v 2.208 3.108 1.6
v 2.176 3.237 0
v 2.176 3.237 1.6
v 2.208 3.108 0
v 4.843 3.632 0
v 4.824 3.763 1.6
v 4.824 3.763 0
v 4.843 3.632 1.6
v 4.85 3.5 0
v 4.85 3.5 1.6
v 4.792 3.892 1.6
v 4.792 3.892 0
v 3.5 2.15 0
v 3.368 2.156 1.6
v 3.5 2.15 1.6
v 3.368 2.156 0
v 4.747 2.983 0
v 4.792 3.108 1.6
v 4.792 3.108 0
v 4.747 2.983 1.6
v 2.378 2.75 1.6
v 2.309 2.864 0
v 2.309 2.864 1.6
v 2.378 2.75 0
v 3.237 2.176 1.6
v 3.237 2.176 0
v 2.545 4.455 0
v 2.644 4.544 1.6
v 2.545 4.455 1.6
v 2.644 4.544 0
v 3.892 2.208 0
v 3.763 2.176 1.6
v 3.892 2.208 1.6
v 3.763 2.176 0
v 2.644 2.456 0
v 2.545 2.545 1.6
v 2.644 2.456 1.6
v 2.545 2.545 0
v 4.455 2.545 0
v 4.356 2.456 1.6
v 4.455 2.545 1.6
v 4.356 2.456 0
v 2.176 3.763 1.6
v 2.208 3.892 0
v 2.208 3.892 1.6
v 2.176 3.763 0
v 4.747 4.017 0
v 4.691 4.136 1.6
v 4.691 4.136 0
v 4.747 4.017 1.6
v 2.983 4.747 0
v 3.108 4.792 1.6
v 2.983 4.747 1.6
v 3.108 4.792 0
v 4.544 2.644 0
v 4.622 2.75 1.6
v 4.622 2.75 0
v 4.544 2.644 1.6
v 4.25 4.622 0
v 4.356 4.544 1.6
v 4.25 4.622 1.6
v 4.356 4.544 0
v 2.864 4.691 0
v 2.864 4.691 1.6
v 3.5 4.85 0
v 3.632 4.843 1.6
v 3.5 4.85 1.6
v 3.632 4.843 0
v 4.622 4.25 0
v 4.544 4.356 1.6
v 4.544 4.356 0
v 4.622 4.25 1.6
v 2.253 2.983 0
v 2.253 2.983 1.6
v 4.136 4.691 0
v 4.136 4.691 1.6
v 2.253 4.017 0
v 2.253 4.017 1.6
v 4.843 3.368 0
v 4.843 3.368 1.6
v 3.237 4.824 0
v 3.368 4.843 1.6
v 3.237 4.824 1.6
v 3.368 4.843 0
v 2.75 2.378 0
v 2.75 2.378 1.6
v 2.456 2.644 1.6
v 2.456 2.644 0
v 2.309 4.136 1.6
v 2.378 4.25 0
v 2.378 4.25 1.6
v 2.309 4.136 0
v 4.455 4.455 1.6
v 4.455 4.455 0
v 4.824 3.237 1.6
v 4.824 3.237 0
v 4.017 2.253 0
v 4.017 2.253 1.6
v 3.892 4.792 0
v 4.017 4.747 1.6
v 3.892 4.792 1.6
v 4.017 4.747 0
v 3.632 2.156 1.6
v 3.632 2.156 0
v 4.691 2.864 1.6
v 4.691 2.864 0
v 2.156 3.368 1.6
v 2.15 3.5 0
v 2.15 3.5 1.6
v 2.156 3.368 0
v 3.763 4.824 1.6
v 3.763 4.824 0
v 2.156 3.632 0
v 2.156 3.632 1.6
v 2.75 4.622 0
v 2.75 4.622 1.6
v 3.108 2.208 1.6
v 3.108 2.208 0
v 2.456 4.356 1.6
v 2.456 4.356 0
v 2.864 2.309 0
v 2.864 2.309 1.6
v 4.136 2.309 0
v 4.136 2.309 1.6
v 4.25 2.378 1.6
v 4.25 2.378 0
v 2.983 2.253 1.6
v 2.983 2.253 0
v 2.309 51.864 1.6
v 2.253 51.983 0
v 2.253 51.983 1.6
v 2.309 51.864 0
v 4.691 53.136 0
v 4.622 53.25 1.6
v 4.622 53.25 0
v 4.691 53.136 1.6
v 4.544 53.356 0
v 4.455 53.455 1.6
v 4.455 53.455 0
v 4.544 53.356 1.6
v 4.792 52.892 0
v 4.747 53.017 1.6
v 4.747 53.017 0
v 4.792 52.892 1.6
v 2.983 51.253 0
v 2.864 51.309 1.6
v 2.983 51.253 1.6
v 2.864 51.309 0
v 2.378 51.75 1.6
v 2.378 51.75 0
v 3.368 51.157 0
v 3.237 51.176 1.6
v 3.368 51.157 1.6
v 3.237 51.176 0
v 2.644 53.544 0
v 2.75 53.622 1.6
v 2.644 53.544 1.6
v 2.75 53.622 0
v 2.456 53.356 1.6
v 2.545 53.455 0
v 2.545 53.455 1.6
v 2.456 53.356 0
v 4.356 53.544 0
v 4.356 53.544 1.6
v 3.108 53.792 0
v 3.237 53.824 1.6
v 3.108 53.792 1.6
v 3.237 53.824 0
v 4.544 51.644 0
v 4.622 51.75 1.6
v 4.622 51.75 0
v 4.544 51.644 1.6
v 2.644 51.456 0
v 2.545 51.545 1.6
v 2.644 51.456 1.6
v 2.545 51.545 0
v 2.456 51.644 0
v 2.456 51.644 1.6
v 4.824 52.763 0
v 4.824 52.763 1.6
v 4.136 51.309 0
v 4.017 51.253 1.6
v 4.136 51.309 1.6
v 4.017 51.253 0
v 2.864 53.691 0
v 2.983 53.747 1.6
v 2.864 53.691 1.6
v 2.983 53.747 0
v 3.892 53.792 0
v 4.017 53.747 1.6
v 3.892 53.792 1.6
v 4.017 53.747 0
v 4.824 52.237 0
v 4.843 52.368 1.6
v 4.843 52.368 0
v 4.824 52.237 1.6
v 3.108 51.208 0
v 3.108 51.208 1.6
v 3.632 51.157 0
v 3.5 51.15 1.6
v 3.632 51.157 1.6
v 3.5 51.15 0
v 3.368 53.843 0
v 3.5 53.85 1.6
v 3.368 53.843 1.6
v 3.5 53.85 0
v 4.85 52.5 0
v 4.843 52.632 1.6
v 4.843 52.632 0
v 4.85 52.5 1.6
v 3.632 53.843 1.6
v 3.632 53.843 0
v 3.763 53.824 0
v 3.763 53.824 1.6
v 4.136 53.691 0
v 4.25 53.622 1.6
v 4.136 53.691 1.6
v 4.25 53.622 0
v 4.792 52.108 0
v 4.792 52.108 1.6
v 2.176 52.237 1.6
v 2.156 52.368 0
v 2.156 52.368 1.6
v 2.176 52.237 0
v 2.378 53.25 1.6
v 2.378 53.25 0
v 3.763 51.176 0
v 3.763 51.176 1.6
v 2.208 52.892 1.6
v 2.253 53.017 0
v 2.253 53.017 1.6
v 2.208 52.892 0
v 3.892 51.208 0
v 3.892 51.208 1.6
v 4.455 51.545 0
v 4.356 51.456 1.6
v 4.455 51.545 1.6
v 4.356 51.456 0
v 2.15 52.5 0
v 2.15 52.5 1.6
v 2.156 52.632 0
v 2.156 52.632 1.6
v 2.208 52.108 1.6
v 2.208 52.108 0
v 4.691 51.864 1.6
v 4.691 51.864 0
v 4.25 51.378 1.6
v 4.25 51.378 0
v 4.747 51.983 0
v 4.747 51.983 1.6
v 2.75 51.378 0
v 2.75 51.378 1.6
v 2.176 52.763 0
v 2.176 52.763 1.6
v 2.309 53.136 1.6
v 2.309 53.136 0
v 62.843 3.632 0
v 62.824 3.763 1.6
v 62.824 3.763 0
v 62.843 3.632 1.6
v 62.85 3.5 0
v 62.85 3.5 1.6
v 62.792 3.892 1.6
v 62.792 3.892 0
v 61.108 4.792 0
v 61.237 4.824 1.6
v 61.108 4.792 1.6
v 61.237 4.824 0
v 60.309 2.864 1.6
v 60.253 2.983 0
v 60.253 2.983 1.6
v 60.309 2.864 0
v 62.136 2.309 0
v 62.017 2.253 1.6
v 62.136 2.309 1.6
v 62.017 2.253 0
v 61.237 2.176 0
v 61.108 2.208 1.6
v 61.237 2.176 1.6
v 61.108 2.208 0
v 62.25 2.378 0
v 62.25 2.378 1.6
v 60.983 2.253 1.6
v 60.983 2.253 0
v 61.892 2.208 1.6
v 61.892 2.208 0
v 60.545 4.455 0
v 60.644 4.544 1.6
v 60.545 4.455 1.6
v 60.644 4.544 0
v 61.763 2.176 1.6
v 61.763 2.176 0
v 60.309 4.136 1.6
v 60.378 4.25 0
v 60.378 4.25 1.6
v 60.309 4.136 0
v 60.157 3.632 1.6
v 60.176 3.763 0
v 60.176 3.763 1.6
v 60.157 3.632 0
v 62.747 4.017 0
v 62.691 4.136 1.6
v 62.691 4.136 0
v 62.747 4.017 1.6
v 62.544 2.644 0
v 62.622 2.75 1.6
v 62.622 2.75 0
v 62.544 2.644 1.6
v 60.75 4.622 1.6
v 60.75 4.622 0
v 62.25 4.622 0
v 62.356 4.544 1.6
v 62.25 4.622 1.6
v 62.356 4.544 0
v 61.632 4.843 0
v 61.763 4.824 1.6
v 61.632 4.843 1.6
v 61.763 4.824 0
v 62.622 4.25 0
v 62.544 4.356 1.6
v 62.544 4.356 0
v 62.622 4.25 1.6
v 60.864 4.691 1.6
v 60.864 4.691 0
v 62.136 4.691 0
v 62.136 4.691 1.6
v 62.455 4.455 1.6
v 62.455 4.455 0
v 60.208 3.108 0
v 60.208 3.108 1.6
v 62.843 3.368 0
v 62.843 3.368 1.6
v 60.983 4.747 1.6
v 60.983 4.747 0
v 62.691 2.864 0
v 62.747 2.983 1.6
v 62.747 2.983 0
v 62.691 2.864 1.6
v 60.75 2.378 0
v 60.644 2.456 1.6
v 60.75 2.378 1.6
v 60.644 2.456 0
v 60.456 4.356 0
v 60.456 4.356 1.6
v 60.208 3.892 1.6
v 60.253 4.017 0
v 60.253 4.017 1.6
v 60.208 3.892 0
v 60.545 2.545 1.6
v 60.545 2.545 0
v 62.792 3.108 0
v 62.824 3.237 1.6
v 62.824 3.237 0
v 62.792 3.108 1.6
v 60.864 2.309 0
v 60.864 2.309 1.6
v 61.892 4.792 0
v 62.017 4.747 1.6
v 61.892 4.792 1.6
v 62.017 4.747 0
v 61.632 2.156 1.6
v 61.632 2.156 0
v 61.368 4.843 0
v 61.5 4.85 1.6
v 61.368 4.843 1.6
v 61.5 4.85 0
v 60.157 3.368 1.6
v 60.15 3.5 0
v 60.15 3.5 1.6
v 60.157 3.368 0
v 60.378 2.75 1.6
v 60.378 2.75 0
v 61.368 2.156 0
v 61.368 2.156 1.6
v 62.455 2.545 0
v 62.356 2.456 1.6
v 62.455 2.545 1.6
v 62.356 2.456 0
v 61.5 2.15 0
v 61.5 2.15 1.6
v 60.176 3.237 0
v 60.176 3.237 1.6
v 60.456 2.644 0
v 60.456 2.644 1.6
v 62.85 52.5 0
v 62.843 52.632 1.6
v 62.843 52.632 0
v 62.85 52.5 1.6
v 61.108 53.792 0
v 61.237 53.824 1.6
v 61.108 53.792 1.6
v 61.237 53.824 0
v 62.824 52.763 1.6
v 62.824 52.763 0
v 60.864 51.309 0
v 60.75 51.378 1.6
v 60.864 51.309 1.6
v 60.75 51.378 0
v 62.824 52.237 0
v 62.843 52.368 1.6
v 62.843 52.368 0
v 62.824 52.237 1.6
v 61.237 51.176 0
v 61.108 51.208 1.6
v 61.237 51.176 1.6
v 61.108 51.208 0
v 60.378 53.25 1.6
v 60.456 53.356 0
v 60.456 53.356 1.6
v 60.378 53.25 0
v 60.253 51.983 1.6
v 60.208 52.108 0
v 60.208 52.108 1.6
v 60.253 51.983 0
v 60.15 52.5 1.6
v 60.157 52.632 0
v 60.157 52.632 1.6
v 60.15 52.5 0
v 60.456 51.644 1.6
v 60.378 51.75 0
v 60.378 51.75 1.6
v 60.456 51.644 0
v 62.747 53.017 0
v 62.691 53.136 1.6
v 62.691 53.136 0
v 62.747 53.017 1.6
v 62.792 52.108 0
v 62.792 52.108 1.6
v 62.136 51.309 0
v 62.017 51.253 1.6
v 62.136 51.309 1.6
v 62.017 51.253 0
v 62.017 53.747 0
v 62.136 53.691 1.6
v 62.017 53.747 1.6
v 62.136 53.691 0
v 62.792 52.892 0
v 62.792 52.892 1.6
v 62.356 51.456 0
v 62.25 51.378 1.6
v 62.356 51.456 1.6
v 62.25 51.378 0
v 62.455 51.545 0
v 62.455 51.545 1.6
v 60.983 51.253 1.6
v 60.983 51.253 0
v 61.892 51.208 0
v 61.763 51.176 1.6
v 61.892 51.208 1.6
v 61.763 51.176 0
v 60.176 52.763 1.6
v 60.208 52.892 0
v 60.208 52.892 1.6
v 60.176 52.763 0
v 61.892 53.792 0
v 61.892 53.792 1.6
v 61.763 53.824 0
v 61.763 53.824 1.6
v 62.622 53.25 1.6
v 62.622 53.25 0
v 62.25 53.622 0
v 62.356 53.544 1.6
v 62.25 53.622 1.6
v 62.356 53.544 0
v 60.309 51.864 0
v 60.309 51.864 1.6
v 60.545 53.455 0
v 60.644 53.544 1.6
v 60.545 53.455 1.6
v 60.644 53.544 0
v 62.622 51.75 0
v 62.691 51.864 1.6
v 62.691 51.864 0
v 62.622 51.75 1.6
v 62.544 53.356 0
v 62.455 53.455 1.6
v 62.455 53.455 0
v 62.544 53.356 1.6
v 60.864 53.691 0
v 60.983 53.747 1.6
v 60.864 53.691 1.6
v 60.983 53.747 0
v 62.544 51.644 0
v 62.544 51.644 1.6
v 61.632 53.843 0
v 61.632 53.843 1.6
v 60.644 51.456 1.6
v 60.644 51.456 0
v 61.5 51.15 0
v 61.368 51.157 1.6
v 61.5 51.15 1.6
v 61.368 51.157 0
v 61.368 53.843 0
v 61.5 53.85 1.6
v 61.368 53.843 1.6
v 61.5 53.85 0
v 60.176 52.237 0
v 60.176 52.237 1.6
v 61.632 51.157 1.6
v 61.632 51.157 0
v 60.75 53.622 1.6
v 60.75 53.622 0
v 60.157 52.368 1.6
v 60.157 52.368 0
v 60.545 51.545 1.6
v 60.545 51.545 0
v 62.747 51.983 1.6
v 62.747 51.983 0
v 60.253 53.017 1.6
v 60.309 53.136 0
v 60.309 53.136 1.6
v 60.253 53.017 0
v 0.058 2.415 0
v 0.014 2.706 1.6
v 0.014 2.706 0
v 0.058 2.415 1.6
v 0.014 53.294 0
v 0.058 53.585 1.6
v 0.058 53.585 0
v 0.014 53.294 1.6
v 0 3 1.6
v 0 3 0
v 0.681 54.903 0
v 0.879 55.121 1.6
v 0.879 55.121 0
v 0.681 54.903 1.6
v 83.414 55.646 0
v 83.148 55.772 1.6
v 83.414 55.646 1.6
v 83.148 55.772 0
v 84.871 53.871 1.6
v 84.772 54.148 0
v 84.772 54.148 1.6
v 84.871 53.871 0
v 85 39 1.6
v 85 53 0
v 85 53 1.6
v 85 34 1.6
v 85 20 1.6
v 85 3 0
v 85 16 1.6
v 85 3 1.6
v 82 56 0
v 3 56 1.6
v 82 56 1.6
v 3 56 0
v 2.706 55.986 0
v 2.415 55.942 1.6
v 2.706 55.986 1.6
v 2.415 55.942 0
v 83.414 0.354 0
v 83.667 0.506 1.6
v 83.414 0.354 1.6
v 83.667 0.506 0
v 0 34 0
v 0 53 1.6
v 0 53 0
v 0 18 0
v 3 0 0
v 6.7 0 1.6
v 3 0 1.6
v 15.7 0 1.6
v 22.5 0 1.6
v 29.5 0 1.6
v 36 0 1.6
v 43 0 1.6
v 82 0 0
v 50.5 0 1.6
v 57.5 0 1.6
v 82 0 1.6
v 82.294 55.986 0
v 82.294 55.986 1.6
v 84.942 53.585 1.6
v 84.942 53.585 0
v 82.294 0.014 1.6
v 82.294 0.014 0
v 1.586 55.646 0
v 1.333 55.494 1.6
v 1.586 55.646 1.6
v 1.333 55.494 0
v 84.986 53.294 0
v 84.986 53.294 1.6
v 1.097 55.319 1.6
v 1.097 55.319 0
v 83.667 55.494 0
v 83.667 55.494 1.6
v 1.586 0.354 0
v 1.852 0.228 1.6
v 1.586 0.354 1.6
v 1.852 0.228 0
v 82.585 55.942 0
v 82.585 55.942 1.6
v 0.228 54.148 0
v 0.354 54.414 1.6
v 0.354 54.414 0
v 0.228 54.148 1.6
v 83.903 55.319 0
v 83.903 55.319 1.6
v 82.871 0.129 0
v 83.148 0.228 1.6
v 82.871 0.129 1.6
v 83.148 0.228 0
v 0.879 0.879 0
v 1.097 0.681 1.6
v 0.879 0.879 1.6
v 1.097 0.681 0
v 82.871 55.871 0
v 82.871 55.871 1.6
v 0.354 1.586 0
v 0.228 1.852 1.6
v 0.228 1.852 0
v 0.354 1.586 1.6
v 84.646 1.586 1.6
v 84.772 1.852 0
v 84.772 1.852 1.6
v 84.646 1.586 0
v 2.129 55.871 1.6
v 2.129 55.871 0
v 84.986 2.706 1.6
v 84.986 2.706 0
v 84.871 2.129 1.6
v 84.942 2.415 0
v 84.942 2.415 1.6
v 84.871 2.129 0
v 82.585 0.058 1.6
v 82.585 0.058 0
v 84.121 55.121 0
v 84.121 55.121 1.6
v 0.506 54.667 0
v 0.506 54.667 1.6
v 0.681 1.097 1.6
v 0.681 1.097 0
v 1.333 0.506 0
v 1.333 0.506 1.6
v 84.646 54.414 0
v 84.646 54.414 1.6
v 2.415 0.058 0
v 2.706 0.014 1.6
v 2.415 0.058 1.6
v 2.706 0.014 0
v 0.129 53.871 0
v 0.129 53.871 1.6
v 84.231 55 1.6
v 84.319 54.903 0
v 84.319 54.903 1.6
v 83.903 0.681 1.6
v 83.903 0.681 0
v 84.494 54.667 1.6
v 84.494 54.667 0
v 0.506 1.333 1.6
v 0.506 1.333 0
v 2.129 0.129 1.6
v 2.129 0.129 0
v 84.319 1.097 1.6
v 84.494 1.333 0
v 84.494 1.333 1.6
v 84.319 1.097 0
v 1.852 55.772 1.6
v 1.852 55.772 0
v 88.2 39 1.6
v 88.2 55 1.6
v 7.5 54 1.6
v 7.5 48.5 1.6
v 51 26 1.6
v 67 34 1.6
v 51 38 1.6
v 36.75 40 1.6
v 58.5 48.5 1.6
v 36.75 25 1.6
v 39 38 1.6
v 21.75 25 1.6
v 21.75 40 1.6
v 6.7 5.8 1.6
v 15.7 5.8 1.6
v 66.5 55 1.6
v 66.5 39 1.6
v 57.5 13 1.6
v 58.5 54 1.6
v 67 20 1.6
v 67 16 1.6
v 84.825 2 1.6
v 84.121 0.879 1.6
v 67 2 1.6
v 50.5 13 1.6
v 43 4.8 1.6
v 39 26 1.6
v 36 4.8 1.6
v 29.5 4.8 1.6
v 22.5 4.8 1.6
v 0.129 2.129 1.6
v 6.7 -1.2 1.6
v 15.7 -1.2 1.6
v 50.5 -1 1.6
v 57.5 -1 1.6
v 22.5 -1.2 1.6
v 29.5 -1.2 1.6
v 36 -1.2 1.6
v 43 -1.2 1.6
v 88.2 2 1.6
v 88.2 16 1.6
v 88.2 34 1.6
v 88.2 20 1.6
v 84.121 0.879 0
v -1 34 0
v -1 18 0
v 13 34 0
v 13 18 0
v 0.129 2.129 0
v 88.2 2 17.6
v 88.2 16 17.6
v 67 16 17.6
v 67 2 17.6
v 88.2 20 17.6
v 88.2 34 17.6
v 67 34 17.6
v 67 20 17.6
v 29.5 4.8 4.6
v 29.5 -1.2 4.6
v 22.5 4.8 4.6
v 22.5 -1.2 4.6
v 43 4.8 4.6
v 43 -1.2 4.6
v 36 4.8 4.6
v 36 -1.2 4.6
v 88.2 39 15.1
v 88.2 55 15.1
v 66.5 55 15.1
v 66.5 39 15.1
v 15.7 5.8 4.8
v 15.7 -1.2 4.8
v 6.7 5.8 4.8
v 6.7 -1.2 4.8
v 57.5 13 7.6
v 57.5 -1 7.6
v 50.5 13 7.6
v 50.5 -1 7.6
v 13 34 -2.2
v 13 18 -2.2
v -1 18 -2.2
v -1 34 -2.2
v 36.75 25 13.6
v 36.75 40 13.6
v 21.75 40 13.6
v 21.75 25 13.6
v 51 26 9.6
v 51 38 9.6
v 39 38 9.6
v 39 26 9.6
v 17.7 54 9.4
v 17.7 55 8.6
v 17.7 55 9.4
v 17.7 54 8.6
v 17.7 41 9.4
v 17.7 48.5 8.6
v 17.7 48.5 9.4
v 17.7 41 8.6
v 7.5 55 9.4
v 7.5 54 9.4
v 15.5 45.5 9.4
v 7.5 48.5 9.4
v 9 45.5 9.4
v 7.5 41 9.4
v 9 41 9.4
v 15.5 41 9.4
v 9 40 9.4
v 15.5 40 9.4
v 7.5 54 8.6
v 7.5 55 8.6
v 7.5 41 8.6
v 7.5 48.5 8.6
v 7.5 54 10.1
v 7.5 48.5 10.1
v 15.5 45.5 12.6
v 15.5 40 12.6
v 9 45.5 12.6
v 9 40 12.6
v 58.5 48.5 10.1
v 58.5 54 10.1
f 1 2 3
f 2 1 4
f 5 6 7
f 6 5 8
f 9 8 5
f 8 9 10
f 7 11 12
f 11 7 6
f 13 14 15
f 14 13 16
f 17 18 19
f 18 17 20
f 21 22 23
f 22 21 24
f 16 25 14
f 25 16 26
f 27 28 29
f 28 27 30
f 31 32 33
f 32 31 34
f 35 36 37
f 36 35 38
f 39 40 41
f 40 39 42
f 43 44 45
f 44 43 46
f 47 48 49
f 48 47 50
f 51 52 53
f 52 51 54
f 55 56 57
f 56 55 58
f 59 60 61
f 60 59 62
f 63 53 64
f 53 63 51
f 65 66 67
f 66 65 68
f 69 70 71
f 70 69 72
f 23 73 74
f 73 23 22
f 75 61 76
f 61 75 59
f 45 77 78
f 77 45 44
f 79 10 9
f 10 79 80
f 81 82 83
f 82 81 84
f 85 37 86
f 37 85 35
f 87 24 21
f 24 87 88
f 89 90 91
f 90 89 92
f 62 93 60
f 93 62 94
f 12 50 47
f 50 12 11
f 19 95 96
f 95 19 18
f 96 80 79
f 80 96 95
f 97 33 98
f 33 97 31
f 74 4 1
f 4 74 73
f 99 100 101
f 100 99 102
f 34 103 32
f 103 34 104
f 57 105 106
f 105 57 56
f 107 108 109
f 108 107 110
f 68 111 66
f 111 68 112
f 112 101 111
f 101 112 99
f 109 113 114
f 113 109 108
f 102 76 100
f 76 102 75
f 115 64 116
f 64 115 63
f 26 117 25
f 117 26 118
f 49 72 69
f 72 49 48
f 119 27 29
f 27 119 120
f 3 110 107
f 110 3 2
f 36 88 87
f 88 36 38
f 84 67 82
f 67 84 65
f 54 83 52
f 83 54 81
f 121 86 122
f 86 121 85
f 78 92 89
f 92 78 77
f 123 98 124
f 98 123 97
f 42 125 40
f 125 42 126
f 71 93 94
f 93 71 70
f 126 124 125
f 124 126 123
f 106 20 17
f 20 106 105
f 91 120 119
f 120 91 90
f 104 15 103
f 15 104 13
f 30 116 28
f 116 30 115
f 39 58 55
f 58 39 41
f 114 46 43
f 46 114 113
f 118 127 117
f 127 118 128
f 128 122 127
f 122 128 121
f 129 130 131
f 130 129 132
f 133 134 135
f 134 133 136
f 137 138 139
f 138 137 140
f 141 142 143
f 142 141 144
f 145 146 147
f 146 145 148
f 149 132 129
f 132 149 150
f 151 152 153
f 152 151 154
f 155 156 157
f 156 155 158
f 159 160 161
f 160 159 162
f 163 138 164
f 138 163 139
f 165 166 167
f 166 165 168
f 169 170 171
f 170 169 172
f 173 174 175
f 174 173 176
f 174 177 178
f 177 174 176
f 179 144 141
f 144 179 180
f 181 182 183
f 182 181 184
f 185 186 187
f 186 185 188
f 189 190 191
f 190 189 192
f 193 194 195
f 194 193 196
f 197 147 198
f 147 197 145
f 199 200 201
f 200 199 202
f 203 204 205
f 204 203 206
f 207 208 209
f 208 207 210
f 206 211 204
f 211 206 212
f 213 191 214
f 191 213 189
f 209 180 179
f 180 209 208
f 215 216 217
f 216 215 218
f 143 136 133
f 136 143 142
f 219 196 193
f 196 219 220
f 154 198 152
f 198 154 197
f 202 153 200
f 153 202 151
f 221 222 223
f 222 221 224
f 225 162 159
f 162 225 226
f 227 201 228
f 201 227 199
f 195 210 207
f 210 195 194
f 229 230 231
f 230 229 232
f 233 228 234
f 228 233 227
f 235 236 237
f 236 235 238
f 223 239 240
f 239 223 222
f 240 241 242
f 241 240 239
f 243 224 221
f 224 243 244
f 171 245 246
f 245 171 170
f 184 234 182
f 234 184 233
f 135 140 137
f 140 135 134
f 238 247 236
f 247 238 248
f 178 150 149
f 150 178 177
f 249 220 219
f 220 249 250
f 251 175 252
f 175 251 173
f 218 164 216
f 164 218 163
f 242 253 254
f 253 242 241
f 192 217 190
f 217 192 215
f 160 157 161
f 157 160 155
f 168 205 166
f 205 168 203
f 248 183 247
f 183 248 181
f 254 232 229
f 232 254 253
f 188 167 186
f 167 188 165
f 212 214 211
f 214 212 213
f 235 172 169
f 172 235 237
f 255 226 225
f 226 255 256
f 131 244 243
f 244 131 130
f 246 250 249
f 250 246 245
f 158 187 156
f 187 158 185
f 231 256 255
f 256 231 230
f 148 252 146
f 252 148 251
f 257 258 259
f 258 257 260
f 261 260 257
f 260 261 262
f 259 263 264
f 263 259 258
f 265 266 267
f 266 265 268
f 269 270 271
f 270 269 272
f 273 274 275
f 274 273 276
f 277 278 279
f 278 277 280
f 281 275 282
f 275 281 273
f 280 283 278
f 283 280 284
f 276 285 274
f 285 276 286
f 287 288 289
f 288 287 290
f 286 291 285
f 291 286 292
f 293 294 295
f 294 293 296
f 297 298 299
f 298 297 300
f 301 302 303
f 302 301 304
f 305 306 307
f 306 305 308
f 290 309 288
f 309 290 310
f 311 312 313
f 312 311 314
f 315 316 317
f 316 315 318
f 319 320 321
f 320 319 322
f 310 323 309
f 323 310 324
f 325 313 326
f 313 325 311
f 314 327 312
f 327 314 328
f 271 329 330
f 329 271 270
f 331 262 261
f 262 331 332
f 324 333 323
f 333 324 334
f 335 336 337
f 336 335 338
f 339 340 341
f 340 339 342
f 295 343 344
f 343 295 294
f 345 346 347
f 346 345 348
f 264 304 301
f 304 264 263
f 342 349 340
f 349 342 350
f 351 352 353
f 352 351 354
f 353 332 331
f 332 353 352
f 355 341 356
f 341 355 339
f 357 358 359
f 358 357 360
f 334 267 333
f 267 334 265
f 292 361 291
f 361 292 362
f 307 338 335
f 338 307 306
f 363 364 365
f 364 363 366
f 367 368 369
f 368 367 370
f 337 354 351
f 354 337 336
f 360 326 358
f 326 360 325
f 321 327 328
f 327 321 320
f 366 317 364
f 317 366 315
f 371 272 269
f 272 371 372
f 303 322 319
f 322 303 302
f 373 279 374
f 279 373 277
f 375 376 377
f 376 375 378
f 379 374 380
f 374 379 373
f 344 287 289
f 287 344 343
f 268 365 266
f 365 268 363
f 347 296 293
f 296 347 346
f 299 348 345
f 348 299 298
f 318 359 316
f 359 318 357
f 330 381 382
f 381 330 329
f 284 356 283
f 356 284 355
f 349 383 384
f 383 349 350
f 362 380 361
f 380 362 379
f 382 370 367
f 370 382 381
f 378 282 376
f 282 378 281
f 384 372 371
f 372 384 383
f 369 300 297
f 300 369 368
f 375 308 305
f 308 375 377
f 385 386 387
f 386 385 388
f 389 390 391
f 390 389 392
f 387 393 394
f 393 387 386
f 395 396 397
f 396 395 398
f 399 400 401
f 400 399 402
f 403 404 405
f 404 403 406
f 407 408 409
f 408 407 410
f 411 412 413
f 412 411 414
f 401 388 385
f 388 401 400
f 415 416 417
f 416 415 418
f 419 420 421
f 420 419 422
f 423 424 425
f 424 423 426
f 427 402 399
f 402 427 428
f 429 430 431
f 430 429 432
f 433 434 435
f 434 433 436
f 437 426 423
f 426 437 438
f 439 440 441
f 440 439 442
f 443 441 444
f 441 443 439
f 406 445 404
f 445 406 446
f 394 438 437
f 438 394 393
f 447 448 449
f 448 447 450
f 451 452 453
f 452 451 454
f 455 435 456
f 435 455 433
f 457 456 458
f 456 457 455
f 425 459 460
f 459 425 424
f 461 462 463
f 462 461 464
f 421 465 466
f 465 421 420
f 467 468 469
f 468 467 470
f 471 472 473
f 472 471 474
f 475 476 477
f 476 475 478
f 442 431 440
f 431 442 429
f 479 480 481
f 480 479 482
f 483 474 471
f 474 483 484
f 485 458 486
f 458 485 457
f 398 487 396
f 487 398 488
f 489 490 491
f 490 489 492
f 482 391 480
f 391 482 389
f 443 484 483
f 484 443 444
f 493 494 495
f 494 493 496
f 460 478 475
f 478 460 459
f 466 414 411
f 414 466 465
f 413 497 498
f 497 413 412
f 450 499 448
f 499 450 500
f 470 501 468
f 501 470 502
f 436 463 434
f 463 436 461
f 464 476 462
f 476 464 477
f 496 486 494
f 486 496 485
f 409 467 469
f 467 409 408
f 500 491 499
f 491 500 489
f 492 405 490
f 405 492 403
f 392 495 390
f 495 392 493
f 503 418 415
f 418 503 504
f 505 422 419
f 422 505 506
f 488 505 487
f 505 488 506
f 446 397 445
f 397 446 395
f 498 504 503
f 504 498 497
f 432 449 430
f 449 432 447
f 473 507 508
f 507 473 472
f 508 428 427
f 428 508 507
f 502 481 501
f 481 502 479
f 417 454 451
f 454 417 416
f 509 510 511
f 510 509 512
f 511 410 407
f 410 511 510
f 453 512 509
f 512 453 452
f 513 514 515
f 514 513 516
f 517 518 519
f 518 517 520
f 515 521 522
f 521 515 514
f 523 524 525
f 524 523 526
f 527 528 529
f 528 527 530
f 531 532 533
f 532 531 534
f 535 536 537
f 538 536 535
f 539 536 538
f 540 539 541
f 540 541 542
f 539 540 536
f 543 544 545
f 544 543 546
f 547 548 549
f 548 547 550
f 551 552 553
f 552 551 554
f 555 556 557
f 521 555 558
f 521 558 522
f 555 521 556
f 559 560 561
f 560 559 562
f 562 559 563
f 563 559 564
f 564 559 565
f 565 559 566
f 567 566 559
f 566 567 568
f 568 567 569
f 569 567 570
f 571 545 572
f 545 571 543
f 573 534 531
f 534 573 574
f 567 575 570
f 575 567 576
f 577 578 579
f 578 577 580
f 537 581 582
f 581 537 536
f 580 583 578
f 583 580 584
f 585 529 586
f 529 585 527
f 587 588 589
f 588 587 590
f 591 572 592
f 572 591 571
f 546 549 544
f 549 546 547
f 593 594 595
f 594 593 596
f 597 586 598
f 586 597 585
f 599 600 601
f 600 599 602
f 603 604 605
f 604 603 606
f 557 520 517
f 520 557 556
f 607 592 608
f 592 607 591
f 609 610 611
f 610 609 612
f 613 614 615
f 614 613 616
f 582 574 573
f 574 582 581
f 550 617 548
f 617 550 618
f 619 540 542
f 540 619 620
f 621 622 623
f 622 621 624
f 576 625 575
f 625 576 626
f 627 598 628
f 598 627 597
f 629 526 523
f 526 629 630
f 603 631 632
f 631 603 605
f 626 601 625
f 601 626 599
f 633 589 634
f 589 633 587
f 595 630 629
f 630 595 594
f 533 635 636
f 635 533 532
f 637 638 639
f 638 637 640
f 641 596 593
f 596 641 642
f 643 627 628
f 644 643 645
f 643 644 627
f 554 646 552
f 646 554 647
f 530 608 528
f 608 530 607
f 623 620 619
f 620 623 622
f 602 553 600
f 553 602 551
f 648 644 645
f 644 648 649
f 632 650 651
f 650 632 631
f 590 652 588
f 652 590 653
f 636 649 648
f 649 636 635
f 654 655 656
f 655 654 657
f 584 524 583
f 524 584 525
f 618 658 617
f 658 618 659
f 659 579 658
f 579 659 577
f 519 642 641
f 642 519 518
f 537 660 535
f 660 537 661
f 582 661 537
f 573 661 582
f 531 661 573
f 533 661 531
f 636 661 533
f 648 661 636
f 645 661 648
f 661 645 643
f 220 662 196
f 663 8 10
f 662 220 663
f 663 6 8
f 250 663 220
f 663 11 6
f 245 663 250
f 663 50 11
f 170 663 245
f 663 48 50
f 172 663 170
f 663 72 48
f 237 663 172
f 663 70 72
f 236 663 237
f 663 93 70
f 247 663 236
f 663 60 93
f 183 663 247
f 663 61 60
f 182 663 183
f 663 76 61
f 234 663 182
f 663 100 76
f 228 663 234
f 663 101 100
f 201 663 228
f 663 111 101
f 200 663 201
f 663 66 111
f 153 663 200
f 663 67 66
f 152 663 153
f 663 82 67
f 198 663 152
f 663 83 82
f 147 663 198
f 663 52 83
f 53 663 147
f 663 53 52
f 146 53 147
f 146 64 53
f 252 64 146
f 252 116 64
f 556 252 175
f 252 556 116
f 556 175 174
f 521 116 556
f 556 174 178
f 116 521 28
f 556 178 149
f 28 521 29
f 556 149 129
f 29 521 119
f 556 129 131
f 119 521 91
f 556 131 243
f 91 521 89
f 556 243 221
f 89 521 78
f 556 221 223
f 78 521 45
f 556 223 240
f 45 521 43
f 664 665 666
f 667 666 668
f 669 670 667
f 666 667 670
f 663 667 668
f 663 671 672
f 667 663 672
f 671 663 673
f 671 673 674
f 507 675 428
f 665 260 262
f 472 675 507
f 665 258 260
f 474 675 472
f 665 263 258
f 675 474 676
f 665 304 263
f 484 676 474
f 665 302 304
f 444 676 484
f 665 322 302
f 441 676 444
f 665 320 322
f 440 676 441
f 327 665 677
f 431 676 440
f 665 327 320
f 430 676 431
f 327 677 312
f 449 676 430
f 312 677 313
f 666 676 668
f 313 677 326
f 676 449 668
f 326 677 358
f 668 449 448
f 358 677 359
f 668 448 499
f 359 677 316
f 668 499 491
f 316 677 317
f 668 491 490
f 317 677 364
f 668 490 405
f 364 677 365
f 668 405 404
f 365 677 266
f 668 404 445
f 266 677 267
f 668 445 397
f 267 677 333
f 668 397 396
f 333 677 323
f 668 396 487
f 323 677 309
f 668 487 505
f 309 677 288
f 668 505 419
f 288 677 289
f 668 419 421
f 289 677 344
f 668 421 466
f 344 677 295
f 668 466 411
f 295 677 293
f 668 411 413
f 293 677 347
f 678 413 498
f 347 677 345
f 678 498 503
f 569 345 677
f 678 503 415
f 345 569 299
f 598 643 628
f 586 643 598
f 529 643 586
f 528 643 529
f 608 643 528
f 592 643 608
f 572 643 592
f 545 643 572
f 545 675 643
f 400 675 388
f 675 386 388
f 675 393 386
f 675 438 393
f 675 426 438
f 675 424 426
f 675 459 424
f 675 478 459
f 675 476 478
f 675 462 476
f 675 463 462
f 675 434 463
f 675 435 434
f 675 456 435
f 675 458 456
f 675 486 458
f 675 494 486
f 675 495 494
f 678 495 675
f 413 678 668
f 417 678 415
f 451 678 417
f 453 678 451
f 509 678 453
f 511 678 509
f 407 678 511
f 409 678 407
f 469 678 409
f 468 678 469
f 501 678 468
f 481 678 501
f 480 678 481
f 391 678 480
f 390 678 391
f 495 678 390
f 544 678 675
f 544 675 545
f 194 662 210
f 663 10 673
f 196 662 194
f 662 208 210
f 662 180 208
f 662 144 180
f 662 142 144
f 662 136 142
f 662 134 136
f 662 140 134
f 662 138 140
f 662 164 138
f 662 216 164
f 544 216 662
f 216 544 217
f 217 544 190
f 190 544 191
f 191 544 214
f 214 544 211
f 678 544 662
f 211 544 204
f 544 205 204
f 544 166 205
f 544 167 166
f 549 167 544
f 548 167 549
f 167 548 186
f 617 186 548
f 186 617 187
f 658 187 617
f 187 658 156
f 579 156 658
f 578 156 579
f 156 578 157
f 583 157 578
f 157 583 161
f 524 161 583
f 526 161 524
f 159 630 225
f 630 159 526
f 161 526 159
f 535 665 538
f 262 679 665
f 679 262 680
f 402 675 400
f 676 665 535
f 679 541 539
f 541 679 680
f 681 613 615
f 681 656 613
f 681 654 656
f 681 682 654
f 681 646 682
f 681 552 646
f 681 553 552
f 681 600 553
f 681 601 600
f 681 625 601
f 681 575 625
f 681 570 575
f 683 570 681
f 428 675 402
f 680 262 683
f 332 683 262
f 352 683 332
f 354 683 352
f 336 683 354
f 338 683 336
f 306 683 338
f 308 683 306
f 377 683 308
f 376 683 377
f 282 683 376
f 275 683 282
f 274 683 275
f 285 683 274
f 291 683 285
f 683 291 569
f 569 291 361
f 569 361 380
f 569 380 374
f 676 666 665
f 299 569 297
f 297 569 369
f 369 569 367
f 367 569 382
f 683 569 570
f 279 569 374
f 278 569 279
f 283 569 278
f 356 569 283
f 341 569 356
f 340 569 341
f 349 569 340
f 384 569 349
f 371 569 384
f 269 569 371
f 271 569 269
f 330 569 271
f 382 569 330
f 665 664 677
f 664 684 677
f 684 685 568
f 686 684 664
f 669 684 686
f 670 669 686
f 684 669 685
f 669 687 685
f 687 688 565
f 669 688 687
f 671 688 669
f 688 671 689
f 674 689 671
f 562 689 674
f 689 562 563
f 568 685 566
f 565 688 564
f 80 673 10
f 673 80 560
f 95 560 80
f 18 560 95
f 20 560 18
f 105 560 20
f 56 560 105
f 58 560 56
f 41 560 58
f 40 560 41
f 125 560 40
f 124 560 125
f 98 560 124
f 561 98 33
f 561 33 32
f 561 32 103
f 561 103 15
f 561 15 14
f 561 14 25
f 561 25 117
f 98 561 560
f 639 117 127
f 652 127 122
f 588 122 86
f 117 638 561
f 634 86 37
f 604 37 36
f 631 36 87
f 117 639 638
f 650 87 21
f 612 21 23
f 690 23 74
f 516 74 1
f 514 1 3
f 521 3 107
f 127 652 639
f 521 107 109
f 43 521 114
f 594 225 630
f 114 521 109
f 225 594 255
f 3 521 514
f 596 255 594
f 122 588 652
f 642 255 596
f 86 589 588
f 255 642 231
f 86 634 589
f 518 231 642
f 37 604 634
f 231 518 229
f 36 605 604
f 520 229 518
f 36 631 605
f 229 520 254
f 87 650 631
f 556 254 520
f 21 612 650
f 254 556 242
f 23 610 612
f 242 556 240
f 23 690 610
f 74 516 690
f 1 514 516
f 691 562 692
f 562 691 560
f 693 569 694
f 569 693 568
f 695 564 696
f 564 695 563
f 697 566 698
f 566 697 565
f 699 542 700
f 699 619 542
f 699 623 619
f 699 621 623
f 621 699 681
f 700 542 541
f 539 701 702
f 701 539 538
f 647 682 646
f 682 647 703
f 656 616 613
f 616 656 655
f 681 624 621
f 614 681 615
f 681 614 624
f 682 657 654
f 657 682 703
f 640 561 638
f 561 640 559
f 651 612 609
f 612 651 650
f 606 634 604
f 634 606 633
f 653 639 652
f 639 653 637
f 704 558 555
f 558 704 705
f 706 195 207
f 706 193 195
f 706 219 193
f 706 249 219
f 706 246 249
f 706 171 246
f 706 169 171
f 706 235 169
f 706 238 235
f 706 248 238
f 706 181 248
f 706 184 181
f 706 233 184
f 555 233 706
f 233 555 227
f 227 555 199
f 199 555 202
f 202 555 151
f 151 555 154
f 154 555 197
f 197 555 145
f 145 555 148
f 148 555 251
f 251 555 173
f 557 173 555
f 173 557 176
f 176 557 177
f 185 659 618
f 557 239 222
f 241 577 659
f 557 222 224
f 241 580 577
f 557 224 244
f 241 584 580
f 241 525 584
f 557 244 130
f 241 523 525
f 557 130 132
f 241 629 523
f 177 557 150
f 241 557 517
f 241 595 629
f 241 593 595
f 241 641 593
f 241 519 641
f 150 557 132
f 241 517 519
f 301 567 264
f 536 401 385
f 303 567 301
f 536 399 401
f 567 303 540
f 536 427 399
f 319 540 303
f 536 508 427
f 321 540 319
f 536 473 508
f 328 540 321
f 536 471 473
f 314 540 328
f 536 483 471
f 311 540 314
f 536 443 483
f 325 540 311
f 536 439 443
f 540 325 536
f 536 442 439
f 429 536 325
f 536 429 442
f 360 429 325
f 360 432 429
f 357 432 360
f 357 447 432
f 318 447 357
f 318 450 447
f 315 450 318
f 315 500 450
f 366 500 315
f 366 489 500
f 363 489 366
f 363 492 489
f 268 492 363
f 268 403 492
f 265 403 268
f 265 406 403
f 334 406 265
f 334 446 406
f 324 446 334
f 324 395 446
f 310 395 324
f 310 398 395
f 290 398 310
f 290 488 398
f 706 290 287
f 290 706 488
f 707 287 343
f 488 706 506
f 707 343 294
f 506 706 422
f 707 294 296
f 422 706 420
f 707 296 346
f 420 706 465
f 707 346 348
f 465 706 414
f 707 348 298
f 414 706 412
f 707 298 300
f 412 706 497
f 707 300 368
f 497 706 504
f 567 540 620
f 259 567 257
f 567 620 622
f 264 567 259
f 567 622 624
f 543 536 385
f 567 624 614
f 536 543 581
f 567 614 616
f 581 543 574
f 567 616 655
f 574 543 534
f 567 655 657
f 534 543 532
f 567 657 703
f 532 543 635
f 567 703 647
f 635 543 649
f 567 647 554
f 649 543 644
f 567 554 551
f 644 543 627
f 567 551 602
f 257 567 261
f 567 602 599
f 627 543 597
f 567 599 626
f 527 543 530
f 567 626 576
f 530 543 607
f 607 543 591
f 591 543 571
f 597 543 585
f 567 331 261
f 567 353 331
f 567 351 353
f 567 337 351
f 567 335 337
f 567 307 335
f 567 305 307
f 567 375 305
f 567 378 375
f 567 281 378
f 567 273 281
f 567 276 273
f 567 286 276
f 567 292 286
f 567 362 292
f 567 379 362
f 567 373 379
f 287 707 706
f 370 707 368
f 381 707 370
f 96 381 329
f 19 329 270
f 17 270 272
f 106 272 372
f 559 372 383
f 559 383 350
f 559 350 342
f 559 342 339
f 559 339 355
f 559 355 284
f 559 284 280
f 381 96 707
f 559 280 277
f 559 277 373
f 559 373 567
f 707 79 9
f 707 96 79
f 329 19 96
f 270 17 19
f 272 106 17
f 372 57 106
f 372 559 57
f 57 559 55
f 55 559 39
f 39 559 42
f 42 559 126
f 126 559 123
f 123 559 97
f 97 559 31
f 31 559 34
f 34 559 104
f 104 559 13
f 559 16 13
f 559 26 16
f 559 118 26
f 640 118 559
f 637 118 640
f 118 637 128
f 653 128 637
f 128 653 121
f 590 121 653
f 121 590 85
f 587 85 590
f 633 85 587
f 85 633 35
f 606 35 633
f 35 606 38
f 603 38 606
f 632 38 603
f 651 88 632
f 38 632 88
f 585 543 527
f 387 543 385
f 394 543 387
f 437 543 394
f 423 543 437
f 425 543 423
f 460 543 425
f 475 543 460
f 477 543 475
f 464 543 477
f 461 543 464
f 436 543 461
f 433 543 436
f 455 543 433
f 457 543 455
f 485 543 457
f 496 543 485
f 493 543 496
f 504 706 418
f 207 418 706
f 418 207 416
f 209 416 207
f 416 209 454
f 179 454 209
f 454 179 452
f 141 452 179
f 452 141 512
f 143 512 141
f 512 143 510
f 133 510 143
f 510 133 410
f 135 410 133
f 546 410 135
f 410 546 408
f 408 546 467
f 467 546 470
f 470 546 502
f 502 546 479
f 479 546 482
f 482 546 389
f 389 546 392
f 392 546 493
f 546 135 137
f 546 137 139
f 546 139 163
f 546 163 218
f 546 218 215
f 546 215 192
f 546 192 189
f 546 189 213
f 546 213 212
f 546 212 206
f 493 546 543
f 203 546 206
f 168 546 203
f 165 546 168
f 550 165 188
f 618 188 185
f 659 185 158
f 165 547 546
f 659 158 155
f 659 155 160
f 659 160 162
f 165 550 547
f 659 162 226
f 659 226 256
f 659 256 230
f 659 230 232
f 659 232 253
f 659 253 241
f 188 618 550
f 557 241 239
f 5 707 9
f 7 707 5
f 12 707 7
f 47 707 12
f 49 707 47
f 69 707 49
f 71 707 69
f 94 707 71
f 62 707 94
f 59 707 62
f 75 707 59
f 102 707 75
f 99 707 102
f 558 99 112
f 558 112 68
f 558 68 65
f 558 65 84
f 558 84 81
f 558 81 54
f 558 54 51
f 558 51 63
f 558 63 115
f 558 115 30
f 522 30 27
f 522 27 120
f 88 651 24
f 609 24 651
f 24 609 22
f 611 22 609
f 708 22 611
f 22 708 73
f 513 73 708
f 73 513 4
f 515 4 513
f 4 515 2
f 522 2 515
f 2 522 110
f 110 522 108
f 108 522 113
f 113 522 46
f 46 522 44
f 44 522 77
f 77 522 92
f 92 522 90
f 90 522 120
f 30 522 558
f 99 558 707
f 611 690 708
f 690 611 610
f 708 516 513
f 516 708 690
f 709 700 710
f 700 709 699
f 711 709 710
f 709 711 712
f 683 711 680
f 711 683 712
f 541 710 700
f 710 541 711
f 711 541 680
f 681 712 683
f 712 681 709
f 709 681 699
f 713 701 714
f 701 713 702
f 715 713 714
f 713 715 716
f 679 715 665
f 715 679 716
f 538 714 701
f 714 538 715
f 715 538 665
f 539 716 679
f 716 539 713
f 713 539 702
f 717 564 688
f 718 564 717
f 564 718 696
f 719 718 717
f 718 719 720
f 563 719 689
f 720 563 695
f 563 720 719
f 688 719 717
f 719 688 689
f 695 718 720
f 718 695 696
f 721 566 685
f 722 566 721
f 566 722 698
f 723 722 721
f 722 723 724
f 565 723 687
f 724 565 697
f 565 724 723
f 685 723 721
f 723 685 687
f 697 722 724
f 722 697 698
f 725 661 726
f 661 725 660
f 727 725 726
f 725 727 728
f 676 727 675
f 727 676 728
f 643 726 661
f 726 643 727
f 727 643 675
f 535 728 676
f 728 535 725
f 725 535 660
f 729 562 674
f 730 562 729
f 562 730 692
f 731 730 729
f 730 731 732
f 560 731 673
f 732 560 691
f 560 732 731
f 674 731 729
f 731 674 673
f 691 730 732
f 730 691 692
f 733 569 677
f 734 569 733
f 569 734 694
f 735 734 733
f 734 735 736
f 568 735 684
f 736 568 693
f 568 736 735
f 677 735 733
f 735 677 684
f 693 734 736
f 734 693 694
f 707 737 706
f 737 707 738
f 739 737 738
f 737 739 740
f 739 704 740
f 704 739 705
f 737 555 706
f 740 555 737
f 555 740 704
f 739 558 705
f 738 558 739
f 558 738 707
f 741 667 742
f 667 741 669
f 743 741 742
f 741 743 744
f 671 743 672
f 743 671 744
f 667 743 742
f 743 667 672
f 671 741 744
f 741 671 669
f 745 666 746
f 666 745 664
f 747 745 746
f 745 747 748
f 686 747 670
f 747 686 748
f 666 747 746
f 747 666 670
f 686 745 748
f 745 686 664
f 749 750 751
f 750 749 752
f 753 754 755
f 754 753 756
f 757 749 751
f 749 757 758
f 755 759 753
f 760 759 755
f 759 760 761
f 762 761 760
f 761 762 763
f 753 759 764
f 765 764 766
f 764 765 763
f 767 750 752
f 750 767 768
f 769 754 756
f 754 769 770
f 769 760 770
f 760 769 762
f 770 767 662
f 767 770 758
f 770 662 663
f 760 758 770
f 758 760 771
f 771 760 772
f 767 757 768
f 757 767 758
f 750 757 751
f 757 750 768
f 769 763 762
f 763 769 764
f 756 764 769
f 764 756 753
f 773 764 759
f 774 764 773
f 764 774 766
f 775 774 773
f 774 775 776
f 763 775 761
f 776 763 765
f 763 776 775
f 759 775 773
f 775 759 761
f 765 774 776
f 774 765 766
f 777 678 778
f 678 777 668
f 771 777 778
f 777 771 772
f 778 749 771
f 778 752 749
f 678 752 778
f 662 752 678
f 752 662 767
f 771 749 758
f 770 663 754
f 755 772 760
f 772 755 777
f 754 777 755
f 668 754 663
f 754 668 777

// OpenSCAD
include <../common.scad>
// All component envelope parameters are in common.scad.
module pi4_board(){ difference(){rounded_box([pi_l,pi_w,pi_pcb],pi_r); for(x=pi_hole_x,y=pi_hole_y)translate([x,y,-eps])cylinder(d=pi_hole_d,h=pi_pcb+2*eps);} }
module pi4_ports(){
 // Approximate footprints conservatively enclose official metal connector outlines.
 for(y=pi_usb_y) translate([pi_usb_x,y,pi_pcb]) cube([pi_l+pi_port_overhang-pi_usb_x,pi_usb_w,pi_usb_h]);
 translate([pi_eth_x,pi_eth_y,pi_pcb]) cube([pi_l+pi_port_overhang-pi_eth_x,pi_eth_w,pi_eth_h]);
 translate([pi_usb_c_x-pi_usb_c_size[0]/2,-pi_usb_c_overhang,pi_pcb]) cube(pi_usb_c_size);
 for(x=pi_hdmi_x)translate([x-pi_hdmi_size[0]/2,-pi_hdmi_overhang,pi_pcb])cube(pi_hdmi_size);
 translate([pi_av_x-pi_av_size[0]/2,-pi_av_overhang,pi_pcb])cube(pi_av_size);
 translate(pi_sd_pos)cube(pi_sd_size);
}
module pi4_header(){translate([pi_header_pos[0],pi_header_pos[1],pi_pcb])cube([pi_header_size[0],pi_header_size[1],pi_header_h]);}
module pi4_heatsinks(){translate([pi_soc_pos[0],pi_soc_pos[1],pi_pcb])cube([pi_soc_size[0],pi_soc_size[1],pi_heatsink_h]); translate([pi_aux_sink_pos[0],pi_aux_sink_pos[1],pi_pcb])cube(pi_aux_sink_size);}
module qwiic_shim(){
 // Pins 1–6 at microSD end of header; conservative connector and PCB envelopes.
 color([0.8,0.07,0.08])translate([shim_pos[0],shim_pos[1],pi_pcb+shim_pos[2]])cube([shim_w,shim_l,shim_t]);
 color([0.05,0.05,0.05])translate([shim_connector_pos[0],shim_connector_pos[1],pi_pcb+shim_pos[2]+shim_t])cube(shim_connector_size);
}
module pi4(include_shim=true){ color([0.05,0.35,0.15])pi4_board();color([0.62,0.65,0.66])pi4_ports();color([0.04,0.04,0.05])pi4_header();color([0.17,0.19,0.2])pi4_heatsinks();if(include_shim)qwiic_shim(); }
pi4();
